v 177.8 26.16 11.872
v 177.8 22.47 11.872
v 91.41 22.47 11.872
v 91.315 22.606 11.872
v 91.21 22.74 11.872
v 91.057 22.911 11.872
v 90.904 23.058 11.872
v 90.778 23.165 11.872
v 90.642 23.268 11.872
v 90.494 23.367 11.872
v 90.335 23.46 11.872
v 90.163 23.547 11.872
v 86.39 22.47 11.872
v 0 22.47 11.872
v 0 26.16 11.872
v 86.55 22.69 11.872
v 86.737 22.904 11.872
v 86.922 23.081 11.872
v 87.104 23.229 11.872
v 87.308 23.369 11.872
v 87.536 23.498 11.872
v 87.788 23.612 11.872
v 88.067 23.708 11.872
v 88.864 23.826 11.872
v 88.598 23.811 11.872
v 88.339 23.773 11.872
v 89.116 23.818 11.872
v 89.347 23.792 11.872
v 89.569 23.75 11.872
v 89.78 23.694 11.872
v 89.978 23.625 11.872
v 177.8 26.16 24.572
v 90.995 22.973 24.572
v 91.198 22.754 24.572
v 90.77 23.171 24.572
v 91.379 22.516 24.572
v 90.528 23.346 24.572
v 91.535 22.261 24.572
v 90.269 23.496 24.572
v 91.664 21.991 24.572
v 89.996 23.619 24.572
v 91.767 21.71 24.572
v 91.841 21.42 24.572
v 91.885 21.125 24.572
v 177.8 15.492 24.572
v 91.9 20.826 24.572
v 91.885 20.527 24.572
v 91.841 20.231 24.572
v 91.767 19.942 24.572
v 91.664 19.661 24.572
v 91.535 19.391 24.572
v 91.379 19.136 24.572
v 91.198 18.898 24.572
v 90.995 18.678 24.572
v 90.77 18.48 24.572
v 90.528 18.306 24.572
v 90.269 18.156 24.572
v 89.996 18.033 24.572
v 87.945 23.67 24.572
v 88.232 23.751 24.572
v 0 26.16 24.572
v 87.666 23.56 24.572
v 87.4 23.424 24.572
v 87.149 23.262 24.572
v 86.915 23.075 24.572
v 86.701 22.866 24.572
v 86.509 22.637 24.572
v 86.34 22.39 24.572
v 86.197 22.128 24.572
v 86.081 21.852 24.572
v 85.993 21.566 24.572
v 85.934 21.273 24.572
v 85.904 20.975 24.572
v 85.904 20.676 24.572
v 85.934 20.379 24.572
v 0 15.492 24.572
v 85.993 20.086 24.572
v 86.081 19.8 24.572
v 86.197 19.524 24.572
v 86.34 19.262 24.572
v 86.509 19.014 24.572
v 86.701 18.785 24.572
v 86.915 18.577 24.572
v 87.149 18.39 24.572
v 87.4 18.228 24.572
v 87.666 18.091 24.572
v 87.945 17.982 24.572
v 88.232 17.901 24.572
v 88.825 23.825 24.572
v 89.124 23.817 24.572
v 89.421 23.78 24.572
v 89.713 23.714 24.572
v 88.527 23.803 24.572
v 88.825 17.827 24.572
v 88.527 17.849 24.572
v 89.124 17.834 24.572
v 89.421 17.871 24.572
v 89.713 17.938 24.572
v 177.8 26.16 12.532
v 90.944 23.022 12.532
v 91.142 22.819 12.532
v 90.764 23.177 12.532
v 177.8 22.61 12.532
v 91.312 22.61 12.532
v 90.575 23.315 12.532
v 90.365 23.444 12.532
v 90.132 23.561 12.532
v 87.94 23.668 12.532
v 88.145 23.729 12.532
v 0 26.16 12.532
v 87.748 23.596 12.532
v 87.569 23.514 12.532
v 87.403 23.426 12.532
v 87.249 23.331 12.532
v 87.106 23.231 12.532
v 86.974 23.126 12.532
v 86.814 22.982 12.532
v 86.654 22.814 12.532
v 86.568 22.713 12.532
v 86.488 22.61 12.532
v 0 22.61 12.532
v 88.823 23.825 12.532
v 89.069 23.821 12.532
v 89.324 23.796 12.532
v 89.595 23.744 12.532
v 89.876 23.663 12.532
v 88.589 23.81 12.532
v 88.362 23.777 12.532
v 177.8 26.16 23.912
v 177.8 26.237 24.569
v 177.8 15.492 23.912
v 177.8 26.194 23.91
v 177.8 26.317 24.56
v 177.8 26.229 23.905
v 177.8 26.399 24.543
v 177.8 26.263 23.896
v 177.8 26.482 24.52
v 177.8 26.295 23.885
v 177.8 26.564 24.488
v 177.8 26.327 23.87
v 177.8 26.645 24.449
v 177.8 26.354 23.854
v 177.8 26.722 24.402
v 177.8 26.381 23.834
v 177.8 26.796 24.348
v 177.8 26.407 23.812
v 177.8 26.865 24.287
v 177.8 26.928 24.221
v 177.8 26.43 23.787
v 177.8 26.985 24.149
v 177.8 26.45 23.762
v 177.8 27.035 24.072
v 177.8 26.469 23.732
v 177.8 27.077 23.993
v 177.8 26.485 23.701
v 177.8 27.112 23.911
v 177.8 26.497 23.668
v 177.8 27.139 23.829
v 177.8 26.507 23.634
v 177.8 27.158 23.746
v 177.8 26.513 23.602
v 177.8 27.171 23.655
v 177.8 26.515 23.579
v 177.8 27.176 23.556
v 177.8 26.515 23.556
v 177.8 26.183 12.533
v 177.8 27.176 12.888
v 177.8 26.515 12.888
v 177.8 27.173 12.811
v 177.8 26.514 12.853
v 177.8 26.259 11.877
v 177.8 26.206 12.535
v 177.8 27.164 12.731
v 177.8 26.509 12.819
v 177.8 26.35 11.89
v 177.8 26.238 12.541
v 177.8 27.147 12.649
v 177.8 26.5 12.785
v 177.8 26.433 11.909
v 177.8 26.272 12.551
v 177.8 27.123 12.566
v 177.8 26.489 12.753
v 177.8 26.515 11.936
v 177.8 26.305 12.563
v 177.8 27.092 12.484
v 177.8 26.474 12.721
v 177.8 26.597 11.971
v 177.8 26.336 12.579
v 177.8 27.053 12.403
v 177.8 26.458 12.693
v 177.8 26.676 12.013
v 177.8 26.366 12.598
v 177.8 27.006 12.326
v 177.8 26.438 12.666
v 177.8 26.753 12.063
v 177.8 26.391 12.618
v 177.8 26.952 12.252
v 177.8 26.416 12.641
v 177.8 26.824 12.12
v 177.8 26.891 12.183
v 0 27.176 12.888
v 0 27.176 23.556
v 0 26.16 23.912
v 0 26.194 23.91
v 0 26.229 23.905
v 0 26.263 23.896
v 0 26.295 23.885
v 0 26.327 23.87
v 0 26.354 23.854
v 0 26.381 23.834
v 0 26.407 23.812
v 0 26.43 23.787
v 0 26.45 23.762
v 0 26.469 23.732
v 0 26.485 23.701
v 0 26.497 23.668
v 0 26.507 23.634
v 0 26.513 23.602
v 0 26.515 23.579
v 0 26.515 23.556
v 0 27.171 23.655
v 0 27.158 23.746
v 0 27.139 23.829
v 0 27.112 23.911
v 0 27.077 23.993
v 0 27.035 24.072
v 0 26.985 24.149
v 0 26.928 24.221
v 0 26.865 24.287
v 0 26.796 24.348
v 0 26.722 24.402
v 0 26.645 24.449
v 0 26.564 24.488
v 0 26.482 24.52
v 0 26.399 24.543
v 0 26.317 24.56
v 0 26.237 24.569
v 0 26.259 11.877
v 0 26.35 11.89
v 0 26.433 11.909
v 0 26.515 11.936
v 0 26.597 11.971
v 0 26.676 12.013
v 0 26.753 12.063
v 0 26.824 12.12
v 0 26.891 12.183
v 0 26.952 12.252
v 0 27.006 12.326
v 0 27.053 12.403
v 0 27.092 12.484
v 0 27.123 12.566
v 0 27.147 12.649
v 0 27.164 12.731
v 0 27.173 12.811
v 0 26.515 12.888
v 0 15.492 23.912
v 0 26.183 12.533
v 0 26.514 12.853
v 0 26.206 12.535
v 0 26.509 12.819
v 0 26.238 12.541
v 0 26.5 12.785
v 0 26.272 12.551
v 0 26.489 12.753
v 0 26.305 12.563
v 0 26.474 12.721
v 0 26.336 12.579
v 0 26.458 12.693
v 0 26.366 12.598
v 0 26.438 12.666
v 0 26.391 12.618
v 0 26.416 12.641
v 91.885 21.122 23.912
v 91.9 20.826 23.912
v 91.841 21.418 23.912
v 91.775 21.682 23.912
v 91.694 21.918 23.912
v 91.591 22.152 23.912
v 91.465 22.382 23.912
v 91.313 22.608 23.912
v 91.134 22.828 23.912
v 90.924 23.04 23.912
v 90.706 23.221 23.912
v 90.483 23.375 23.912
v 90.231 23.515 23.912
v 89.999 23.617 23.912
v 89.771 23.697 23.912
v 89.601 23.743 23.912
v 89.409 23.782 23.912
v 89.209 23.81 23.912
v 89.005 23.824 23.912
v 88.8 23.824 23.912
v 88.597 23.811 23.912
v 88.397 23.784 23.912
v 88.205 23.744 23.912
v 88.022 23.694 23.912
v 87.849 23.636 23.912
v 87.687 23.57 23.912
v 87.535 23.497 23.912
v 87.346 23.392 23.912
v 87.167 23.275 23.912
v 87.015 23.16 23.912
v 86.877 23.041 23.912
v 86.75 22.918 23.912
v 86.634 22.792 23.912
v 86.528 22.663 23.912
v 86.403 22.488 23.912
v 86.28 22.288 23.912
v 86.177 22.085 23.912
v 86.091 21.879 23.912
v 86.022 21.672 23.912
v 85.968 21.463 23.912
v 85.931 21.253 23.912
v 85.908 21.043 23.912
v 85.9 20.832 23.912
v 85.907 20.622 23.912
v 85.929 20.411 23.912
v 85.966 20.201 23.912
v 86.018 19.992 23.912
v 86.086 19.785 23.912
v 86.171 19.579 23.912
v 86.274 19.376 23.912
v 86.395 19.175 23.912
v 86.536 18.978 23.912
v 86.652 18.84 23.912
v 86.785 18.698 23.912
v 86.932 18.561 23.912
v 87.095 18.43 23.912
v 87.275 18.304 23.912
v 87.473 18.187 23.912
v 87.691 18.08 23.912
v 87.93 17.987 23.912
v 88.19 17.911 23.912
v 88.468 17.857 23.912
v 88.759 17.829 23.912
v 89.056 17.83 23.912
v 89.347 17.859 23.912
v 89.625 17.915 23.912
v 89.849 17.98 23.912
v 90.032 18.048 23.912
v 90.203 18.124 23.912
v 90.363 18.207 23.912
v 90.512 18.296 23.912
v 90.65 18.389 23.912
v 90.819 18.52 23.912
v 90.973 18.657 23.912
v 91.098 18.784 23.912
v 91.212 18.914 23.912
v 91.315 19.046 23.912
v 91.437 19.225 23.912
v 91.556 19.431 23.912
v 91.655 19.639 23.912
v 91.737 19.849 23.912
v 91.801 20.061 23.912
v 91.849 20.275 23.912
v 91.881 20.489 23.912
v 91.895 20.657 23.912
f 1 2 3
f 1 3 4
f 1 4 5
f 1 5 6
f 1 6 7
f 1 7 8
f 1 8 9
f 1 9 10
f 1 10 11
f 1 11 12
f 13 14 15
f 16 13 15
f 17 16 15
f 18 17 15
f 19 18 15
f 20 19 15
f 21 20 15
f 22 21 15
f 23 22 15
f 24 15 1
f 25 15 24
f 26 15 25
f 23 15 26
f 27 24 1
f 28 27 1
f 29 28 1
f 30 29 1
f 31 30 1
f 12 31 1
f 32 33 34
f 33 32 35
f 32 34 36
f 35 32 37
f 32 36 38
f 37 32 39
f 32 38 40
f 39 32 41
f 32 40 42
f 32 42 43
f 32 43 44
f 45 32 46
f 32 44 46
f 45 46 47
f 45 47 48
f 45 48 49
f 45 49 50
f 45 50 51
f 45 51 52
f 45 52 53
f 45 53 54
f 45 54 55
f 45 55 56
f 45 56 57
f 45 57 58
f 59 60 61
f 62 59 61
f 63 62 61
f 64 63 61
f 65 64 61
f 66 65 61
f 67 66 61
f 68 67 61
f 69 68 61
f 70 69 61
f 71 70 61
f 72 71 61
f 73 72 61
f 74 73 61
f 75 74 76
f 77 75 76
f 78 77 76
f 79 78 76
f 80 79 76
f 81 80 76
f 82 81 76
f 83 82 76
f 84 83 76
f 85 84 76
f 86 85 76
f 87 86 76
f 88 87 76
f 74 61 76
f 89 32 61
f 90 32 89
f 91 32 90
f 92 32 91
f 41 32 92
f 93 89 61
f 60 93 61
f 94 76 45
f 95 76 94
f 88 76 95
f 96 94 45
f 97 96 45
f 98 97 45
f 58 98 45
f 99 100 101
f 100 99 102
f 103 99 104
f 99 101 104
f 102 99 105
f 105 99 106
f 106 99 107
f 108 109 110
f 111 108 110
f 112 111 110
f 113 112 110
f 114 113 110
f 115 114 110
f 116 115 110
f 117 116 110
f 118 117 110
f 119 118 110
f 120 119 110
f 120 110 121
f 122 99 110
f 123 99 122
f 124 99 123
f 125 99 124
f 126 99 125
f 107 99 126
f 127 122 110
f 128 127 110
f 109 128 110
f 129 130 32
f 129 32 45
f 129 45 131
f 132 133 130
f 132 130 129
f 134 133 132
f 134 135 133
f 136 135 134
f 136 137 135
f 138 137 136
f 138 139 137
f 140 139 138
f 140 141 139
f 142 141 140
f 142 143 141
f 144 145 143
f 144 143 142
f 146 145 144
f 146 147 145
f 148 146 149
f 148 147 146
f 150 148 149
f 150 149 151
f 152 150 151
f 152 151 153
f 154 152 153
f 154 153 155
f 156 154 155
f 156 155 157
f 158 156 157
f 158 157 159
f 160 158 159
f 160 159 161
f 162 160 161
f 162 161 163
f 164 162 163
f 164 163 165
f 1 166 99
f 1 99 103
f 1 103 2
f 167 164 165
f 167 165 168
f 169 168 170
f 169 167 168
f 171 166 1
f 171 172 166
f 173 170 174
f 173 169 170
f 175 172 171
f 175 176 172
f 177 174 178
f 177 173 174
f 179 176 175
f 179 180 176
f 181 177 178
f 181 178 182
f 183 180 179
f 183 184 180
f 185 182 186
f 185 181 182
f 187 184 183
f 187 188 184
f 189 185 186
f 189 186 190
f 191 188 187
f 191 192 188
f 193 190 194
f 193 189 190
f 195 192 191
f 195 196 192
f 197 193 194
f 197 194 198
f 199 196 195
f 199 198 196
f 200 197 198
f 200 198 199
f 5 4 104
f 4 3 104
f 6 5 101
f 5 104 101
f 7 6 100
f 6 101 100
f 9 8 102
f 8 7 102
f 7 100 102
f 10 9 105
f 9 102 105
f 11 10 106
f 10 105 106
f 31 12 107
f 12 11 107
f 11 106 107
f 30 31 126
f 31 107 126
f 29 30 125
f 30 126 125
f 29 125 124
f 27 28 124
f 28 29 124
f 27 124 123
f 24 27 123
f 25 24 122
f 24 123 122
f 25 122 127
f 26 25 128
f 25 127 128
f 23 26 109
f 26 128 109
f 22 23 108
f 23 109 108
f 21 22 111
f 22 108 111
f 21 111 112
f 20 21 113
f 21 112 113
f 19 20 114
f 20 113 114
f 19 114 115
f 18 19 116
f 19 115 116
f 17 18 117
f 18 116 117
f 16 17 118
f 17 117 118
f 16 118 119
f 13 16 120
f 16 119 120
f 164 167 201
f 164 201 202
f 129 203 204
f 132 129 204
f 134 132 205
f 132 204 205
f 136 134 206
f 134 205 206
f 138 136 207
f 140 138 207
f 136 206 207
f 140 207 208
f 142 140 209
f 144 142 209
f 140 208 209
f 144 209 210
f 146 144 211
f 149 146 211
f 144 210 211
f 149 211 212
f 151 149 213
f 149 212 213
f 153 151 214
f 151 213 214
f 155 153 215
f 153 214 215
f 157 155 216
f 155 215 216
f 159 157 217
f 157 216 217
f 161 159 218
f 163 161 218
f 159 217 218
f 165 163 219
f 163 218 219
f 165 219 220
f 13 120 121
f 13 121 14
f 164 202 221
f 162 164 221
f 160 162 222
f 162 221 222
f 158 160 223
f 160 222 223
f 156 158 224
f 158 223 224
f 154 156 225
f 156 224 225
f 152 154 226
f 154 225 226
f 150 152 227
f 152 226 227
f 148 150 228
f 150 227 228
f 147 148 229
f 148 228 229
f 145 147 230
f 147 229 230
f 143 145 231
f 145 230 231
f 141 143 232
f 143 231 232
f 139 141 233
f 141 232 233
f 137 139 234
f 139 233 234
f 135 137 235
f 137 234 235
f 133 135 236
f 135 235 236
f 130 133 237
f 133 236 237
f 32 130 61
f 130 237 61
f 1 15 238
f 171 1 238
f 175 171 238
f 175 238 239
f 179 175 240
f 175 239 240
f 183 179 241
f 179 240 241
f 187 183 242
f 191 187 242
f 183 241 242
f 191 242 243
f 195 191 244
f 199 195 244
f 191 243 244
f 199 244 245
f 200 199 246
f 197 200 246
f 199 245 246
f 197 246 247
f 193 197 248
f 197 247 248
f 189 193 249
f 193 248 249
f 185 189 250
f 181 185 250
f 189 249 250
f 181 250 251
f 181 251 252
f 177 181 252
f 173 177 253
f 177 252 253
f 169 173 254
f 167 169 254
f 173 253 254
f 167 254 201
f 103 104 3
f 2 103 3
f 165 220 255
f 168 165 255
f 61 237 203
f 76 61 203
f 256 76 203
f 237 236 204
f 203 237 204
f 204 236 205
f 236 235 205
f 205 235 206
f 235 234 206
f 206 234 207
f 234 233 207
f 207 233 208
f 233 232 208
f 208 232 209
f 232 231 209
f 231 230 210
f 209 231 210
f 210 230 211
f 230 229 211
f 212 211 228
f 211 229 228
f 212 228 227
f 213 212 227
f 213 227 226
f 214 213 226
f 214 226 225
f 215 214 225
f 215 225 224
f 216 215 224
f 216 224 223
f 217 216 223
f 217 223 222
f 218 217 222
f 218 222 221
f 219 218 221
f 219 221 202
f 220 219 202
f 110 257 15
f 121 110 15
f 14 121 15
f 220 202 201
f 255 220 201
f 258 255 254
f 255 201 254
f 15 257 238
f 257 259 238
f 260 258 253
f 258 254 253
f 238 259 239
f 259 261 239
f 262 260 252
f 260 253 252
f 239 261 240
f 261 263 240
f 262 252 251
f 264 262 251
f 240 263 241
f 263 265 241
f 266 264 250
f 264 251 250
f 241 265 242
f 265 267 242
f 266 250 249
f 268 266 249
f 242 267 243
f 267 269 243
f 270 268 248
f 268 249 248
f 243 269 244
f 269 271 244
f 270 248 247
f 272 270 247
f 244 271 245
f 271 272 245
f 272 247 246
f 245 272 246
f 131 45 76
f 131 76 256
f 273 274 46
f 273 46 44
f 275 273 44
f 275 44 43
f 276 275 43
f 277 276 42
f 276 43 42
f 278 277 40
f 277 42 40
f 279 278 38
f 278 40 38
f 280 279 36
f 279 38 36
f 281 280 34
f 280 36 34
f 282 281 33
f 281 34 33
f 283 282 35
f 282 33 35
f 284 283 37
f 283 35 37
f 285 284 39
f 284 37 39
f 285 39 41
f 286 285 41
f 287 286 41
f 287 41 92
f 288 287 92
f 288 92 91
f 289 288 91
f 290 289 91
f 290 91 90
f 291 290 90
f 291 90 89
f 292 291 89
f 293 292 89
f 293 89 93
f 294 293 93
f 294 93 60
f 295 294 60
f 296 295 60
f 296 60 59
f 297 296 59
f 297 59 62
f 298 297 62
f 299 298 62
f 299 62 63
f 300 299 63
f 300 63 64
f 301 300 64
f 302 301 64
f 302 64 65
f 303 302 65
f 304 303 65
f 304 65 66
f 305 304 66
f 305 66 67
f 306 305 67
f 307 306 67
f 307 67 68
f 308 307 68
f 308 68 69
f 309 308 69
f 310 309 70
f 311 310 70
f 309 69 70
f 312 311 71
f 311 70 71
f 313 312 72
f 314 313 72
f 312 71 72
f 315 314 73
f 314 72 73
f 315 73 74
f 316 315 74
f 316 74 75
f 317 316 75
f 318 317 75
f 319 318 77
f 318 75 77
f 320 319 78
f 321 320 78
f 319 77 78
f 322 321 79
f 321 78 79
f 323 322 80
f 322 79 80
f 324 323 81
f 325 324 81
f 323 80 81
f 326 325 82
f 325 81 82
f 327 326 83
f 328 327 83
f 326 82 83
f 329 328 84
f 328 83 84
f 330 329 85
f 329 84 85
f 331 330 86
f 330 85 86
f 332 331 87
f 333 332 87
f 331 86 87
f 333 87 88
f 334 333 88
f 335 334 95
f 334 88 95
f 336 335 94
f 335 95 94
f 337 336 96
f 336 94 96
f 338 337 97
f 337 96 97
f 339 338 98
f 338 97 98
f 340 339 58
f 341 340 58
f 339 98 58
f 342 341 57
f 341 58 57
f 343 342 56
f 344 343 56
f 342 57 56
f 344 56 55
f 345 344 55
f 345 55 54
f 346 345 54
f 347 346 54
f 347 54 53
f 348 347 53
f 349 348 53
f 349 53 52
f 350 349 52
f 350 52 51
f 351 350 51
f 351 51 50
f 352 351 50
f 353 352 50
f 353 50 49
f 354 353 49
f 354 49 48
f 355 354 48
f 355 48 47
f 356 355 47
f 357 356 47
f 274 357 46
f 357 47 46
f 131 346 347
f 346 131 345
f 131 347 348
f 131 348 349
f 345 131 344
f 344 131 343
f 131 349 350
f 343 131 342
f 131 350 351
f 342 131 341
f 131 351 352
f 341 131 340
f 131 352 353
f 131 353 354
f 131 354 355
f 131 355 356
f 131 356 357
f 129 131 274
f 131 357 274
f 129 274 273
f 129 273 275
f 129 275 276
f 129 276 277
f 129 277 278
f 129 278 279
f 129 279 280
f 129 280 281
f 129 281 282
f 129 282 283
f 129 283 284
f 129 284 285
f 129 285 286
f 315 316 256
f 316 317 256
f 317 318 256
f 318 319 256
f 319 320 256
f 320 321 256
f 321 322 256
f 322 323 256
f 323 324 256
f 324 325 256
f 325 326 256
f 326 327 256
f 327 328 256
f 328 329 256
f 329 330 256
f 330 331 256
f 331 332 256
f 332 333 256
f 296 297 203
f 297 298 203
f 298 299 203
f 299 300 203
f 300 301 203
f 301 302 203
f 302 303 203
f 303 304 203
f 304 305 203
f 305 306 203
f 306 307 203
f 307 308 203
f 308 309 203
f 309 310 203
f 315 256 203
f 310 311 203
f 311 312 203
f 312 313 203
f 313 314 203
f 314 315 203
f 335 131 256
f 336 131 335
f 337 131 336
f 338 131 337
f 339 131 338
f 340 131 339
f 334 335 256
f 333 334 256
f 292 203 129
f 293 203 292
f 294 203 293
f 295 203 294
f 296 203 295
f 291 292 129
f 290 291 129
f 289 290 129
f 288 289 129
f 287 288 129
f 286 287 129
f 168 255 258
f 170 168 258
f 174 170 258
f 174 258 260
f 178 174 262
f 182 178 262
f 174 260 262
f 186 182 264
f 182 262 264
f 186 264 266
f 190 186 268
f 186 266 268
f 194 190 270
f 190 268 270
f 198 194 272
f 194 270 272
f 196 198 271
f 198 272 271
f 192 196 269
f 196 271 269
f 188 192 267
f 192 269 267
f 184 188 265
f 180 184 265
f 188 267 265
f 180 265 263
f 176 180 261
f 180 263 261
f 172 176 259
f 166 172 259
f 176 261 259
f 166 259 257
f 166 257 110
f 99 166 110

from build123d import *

# Parameters (mm, degrees)
BOSS_EXTRUDE1_DEPTH = 177.8
SCALE1_SCALE_X      = 1
SCALE1_SCALE_Y      = 0.4
SCALE1_SCALE_Z      = 0.4
SKETCH2_R           = 3
CUT_EXTRUDE1_DEPTH  = 181.312669663


with BuildPart() as part:
    # Sketch1 → Boss-Extrude1 (new body)
    with BuildSketch(Plane(origin=(0, 0, 0), x_dir=(0, 0, -1), z_dir=(1, 0, 0))):
        with BuildLine():
            Line((0, 19.984441283), (0, 29.21))
            ThreePointArc((0, 29.21), (-0.743948776, 31.006051224), (-2.54, 31.75))
            Line((-2.54, 31.75), (-29.21, 31.75))
            ThreePointArc((-29.21, 31.75), (-31.006051224, 31.006051224), (-31.75, 29.21))
            Line((-31.75, 29.21), (-31.75, 2.54))
            Line((-31.75, 2.54), (-30.099, 2.54))
            Line((-30.099, 2.54), (-30.099, 29.21))
            ThreePointArc((-30.099, 29.21), (-29.838617928, 29.838617928), (-29.21, 30.099))
            Line((-29.21, 30.099), (-2.54, 30.099))
            ThreePointArc((-2.54, 30.099), (-1.911382072, 29.838617928), (-1.651, 29.21))
            Line((-1.651, 29.21), (-1.651, 20.335372167))
            Line((-1.651, 20.335372167), (0, 19.984441283))
        make_face()
    extrude(amount=BOSS_EXTRUDE1_DEPTH)


with BuildPart() as part_1:
    # Scale1: scaled about (88.9, 24.126477206, 19.786725681)
    add(part.part.scale((SCALE1_SCALE_X, SCALE1_SCALE_Y, SCALE1_SCALE_Z), about=(88.9, 24.126477206, 19.786725681)))

    # Sketch2 → Cut-Extrude1 (cut, through all)
    with BuildSketch(Plane.XY.offset(24.572035408)):
        with Locations((88.9, 20.825886324)):
            Circle(SKETCH2_R)
    extrude(amount=-CUT_EXTRUDE1_DEPTH, mode=Mode.SUBTRACT)


solid = part_1.part
